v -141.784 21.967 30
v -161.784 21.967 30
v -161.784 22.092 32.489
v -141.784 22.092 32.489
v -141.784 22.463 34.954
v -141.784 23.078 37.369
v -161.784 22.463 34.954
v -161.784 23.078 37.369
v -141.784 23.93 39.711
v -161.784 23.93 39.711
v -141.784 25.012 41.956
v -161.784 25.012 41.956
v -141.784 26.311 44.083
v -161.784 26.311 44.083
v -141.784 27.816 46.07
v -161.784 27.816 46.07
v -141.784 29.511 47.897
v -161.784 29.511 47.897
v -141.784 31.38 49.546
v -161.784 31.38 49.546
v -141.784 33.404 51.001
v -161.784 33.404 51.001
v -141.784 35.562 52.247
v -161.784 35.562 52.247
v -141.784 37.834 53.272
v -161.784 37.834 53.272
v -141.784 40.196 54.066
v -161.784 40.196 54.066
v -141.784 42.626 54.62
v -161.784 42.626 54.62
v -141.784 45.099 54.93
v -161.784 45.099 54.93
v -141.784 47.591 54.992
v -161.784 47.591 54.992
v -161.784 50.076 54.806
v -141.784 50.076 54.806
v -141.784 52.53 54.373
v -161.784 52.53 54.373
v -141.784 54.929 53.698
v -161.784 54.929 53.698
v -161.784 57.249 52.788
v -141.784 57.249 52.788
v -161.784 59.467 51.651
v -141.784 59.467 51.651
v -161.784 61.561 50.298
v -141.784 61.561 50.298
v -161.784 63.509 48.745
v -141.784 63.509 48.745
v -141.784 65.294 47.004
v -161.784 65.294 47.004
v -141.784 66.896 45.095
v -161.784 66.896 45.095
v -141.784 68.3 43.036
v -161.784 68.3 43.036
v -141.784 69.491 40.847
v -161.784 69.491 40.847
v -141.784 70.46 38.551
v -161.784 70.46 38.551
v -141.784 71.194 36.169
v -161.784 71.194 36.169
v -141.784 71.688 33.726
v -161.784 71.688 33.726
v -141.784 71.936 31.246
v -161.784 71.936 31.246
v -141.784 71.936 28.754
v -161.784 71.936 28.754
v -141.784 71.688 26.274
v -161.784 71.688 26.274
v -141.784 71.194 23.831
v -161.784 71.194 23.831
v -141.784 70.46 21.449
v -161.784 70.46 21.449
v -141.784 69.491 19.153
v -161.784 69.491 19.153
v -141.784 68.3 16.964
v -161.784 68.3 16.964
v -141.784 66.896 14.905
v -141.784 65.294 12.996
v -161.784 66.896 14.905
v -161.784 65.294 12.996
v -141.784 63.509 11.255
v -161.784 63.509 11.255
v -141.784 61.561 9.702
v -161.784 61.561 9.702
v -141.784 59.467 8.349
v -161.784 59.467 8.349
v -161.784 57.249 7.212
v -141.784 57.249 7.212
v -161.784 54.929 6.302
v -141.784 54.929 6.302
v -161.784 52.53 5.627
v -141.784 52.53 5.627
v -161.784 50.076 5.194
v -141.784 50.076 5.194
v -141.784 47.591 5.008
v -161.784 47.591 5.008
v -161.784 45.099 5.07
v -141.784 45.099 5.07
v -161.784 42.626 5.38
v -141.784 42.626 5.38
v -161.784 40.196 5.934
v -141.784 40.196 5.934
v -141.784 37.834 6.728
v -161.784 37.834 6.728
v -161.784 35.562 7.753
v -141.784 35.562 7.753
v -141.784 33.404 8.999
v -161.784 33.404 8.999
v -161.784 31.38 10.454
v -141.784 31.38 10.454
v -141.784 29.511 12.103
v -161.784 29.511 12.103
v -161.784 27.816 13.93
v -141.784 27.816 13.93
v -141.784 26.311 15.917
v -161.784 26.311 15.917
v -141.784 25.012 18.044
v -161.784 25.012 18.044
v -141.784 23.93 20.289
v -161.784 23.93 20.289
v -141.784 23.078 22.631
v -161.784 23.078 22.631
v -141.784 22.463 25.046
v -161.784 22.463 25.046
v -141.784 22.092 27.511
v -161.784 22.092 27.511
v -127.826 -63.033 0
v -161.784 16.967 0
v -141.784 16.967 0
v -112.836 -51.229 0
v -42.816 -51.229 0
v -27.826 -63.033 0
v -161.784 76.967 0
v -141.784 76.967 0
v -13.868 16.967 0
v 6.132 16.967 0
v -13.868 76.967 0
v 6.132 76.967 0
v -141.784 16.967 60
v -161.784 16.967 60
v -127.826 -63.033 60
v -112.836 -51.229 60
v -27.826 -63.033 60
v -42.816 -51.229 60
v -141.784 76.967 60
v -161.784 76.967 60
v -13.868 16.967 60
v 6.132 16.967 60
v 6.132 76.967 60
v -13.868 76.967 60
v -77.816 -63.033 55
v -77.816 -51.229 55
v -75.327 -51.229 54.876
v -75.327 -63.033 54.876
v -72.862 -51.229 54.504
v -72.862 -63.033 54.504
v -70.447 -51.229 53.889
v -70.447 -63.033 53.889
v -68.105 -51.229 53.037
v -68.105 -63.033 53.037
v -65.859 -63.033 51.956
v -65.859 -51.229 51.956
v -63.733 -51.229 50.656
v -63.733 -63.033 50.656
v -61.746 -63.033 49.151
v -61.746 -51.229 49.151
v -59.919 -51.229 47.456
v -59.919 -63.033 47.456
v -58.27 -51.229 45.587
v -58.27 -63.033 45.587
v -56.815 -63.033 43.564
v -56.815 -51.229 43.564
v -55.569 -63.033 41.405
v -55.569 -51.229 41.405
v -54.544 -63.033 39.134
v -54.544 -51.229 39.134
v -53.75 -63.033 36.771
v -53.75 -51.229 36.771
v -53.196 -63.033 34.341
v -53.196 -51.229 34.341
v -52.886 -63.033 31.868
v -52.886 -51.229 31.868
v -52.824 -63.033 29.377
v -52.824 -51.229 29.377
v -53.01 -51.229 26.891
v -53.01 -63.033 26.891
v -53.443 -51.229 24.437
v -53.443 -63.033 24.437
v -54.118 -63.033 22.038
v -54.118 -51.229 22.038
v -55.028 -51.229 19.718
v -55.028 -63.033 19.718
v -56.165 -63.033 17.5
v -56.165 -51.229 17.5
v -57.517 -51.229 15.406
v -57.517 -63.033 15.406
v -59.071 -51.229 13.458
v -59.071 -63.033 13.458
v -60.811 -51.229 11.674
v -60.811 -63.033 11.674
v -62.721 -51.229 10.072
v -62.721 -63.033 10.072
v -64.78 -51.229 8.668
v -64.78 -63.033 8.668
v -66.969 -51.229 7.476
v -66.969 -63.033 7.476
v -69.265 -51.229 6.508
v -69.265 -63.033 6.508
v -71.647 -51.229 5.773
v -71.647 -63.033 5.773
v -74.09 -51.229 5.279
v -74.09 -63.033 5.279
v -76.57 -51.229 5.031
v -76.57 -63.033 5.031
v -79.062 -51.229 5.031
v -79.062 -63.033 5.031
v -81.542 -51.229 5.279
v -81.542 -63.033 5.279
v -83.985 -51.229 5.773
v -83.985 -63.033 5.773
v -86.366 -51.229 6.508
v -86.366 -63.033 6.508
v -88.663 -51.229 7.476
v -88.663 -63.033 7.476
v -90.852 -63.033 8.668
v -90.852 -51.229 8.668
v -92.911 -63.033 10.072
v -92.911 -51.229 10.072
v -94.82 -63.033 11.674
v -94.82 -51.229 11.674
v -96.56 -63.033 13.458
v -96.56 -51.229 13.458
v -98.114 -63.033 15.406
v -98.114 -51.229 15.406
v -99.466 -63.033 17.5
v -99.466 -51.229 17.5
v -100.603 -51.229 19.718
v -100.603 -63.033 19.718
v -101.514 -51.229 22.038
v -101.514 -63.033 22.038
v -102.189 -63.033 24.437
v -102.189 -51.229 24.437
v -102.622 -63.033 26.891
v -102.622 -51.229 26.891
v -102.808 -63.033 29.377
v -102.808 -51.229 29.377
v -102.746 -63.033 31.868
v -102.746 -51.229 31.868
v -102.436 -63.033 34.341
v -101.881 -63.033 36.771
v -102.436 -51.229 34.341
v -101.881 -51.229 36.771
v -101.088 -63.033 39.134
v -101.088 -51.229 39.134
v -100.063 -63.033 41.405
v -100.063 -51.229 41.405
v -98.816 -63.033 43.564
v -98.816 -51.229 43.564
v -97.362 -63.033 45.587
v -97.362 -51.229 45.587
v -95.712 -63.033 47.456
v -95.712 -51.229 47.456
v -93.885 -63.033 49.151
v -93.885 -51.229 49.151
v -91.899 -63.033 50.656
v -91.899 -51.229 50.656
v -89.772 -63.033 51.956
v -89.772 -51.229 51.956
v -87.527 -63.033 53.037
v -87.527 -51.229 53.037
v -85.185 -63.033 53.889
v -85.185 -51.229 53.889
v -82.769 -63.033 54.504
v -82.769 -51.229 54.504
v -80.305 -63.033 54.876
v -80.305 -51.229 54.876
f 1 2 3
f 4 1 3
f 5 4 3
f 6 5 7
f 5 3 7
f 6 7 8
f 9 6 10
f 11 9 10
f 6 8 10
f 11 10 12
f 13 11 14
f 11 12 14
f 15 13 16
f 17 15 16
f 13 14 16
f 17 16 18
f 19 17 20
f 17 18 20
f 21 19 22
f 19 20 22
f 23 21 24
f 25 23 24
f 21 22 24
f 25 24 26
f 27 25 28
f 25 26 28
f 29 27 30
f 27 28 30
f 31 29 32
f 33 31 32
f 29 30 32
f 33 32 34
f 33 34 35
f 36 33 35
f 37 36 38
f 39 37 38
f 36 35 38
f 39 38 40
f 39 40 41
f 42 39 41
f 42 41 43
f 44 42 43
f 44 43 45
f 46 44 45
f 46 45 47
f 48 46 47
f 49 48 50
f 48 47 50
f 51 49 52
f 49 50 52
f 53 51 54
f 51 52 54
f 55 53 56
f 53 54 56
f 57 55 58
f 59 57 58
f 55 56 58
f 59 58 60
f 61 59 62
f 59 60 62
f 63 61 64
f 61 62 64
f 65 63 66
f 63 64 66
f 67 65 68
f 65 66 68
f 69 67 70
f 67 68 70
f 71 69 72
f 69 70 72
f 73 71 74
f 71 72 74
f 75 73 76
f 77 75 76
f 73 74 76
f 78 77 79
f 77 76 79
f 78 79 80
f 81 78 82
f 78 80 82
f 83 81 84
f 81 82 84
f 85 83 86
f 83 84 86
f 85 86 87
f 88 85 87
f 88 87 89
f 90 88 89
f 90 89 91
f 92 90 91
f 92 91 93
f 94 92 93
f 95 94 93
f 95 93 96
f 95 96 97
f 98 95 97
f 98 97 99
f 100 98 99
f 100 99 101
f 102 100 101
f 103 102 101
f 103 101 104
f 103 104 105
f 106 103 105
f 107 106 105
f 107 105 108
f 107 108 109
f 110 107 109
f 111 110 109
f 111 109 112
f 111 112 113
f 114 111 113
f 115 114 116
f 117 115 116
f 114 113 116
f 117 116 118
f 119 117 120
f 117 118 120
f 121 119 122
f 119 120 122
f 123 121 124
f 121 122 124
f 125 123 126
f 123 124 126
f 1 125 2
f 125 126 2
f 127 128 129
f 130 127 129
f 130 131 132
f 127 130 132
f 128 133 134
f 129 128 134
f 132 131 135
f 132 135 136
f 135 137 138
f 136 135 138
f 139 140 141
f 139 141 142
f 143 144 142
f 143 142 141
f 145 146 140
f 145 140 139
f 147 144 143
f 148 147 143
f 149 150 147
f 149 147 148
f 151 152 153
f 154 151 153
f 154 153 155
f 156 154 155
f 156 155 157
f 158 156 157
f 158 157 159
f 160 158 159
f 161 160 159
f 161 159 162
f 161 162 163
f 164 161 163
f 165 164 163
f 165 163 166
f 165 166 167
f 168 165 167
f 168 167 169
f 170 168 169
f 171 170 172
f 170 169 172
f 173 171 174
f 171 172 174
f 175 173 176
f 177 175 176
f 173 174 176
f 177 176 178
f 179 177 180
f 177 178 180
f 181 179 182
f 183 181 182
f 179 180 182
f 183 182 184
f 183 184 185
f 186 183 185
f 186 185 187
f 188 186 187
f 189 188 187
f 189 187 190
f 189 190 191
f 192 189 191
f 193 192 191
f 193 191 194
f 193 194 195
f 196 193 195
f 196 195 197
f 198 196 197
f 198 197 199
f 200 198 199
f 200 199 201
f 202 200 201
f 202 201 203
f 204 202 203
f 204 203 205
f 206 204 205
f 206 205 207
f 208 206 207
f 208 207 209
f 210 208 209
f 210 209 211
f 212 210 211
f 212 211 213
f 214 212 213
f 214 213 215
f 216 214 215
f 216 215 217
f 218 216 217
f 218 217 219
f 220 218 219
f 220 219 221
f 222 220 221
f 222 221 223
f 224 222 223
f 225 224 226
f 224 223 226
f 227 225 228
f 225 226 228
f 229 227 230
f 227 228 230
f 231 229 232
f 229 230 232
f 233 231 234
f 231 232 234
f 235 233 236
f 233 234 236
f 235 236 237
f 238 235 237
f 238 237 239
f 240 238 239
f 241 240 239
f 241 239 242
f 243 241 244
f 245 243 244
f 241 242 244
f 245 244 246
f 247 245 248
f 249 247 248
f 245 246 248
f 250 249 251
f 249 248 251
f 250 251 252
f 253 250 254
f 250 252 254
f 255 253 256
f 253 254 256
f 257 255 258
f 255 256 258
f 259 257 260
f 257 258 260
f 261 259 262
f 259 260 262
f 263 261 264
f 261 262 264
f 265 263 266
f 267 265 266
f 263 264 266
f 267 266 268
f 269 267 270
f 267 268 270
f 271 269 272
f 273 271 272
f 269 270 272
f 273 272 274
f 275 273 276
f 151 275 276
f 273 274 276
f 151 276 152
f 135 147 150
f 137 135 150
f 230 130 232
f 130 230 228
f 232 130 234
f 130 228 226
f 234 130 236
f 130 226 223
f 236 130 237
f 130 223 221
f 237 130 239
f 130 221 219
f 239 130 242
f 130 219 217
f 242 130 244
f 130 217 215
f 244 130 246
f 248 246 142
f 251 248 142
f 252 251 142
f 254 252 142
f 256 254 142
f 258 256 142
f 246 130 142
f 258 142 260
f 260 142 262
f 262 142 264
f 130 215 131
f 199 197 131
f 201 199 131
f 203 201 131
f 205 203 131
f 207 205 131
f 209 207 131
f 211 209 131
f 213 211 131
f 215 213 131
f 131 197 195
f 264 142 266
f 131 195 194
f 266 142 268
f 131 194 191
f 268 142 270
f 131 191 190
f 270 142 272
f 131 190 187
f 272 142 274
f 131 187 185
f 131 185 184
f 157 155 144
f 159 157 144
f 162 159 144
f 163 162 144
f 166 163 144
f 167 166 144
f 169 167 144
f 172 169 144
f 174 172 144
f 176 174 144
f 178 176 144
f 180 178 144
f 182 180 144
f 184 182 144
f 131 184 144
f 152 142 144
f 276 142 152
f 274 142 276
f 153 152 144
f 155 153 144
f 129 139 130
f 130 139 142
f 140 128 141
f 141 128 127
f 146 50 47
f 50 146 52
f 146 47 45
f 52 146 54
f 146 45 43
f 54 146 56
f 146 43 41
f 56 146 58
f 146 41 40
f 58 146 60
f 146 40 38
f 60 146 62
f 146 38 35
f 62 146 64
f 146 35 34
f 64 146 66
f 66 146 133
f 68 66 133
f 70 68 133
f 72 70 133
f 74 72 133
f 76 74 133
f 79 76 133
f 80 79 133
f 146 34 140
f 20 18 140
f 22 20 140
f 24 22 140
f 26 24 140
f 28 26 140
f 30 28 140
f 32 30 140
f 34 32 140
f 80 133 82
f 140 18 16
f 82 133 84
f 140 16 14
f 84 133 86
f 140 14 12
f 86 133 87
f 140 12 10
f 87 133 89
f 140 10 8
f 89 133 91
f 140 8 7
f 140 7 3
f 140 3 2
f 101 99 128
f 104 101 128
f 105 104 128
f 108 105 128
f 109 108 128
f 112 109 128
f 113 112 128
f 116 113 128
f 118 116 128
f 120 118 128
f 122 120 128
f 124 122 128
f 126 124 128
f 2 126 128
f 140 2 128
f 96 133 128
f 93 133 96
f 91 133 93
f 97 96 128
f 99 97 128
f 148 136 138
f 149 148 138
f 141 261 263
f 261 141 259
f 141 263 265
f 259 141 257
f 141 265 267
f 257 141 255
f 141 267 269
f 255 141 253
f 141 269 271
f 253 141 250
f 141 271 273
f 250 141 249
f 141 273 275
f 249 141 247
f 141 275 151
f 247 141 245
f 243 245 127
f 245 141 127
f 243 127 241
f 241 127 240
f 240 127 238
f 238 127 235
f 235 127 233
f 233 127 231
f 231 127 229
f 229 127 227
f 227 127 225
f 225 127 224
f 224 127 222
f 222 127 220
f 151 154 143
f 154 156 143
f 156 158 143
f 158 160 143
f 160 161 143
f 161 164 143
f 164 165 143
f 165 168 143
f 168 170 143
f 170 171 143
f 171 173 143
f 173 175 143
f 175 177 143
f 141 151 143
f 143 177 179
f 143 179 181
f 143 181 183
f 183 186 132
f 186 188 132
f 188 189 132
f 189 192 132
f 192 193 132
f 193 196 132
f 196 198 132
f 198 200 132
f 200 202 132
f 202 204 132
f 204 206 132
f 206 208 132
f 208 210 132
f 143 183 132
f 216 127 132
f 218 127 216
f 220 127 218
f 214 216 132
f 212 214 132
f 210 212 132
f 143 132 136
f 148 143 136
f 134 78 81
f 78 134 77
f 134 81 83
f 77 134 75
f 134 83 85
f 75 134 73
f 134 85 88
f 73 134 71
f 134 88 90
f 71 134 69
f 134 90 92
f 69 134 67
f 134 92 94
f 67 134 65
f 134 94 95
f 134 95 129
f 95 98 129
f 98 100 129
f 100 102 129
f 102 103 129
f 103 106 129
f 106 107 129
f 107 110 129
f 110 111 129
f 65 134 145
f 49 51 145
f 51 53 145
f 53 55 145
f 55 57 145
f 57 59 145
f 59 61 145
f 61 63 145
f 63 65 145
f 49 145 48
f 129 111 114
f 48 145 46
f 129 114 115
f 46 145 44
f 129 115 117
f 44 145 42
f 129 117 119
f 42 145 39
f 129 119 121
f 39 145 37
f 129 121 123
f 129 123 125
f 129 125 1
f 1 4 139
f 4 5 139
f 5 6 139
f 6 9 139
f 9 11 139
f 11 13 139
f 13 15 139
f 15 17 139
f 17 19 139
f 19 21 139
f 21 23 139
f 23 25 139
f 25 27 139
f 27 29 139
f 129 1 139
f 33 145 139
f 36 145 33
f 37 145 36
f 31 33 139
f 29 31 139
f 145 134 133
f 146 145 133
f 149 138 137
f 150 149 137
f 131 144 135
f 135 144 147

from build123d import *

# Parameters (mm, degrees)
EXTRUDE_2_DEPTH     = 60
CUT_EXTRUDE_2_DEPTH = 189.939286944
SKETCH_7_R          = 25
CUT_EXTRUDE_4_DEPTH = 20
SKETCH_8_R          = 25
CUT_EXTRUDE_5_DEPTH = 20


with BuildPart() as part:
    # 草图1 → 凸台-拉伸2 (new body)
    with BuildSketch(Plane.XY):
        Polygon((-161.784091828, 76.967277349), (-161.784091828, 16.967277349), (-127.826106531, -63.032722651), (-27.826106531, -63.032722651), (6.131878766, 16.967277349), (6.131878766, 76.967277349), align=None)
    extrude(amount=EXTRUDE_2_DEPTH)

    # 草图5 → 切除-拉伸2 (cut, through all)
    with BuildSketch(Plane.XY.offset(60)):
        Polygon((-141.784091828, 76.967277349), (-141.784091828, 16.967277349), (-112.836441026, -51.229114277), (-42.815772036, -51.229114277), (-13.868121234, 16.967277349), (-13.868121234, 76.967277349), align=None)
    extrude(amount=-CUT_EXTRUDE_2_DEPTH, mode=Mode.SUBTRACT)

    # 草图7 → 切除-拉伸4 (cut)
    with BuildSketch(Plane.ZY.offset(161.784091828)):
        with Locations(Location((30, 46.967277349, 0), (0, 0, 270))):
            Circle(SKETCH_7_R)
    extrude(amount=-CUT_EXTRUDE_4_DEPTH, mode=Mode.SUBTRACT)

    # 草图8 → 切除-拉伸5 (cut)
    with BuildSketch(Plane(origin=(0, -51.229114277, 0), x_dir=(1, 0, 0), z_dir=(0, 1, 0))):
        with Locations(Location((-77.815772036, -30, 0), (0, 0, 270))):
            Circle(SKETCH_8_R)
    extrude(amount=-CUT_EXTRUDE_5_DEPTH, mode=Mode.SUBTRACT)


solid = part.part
